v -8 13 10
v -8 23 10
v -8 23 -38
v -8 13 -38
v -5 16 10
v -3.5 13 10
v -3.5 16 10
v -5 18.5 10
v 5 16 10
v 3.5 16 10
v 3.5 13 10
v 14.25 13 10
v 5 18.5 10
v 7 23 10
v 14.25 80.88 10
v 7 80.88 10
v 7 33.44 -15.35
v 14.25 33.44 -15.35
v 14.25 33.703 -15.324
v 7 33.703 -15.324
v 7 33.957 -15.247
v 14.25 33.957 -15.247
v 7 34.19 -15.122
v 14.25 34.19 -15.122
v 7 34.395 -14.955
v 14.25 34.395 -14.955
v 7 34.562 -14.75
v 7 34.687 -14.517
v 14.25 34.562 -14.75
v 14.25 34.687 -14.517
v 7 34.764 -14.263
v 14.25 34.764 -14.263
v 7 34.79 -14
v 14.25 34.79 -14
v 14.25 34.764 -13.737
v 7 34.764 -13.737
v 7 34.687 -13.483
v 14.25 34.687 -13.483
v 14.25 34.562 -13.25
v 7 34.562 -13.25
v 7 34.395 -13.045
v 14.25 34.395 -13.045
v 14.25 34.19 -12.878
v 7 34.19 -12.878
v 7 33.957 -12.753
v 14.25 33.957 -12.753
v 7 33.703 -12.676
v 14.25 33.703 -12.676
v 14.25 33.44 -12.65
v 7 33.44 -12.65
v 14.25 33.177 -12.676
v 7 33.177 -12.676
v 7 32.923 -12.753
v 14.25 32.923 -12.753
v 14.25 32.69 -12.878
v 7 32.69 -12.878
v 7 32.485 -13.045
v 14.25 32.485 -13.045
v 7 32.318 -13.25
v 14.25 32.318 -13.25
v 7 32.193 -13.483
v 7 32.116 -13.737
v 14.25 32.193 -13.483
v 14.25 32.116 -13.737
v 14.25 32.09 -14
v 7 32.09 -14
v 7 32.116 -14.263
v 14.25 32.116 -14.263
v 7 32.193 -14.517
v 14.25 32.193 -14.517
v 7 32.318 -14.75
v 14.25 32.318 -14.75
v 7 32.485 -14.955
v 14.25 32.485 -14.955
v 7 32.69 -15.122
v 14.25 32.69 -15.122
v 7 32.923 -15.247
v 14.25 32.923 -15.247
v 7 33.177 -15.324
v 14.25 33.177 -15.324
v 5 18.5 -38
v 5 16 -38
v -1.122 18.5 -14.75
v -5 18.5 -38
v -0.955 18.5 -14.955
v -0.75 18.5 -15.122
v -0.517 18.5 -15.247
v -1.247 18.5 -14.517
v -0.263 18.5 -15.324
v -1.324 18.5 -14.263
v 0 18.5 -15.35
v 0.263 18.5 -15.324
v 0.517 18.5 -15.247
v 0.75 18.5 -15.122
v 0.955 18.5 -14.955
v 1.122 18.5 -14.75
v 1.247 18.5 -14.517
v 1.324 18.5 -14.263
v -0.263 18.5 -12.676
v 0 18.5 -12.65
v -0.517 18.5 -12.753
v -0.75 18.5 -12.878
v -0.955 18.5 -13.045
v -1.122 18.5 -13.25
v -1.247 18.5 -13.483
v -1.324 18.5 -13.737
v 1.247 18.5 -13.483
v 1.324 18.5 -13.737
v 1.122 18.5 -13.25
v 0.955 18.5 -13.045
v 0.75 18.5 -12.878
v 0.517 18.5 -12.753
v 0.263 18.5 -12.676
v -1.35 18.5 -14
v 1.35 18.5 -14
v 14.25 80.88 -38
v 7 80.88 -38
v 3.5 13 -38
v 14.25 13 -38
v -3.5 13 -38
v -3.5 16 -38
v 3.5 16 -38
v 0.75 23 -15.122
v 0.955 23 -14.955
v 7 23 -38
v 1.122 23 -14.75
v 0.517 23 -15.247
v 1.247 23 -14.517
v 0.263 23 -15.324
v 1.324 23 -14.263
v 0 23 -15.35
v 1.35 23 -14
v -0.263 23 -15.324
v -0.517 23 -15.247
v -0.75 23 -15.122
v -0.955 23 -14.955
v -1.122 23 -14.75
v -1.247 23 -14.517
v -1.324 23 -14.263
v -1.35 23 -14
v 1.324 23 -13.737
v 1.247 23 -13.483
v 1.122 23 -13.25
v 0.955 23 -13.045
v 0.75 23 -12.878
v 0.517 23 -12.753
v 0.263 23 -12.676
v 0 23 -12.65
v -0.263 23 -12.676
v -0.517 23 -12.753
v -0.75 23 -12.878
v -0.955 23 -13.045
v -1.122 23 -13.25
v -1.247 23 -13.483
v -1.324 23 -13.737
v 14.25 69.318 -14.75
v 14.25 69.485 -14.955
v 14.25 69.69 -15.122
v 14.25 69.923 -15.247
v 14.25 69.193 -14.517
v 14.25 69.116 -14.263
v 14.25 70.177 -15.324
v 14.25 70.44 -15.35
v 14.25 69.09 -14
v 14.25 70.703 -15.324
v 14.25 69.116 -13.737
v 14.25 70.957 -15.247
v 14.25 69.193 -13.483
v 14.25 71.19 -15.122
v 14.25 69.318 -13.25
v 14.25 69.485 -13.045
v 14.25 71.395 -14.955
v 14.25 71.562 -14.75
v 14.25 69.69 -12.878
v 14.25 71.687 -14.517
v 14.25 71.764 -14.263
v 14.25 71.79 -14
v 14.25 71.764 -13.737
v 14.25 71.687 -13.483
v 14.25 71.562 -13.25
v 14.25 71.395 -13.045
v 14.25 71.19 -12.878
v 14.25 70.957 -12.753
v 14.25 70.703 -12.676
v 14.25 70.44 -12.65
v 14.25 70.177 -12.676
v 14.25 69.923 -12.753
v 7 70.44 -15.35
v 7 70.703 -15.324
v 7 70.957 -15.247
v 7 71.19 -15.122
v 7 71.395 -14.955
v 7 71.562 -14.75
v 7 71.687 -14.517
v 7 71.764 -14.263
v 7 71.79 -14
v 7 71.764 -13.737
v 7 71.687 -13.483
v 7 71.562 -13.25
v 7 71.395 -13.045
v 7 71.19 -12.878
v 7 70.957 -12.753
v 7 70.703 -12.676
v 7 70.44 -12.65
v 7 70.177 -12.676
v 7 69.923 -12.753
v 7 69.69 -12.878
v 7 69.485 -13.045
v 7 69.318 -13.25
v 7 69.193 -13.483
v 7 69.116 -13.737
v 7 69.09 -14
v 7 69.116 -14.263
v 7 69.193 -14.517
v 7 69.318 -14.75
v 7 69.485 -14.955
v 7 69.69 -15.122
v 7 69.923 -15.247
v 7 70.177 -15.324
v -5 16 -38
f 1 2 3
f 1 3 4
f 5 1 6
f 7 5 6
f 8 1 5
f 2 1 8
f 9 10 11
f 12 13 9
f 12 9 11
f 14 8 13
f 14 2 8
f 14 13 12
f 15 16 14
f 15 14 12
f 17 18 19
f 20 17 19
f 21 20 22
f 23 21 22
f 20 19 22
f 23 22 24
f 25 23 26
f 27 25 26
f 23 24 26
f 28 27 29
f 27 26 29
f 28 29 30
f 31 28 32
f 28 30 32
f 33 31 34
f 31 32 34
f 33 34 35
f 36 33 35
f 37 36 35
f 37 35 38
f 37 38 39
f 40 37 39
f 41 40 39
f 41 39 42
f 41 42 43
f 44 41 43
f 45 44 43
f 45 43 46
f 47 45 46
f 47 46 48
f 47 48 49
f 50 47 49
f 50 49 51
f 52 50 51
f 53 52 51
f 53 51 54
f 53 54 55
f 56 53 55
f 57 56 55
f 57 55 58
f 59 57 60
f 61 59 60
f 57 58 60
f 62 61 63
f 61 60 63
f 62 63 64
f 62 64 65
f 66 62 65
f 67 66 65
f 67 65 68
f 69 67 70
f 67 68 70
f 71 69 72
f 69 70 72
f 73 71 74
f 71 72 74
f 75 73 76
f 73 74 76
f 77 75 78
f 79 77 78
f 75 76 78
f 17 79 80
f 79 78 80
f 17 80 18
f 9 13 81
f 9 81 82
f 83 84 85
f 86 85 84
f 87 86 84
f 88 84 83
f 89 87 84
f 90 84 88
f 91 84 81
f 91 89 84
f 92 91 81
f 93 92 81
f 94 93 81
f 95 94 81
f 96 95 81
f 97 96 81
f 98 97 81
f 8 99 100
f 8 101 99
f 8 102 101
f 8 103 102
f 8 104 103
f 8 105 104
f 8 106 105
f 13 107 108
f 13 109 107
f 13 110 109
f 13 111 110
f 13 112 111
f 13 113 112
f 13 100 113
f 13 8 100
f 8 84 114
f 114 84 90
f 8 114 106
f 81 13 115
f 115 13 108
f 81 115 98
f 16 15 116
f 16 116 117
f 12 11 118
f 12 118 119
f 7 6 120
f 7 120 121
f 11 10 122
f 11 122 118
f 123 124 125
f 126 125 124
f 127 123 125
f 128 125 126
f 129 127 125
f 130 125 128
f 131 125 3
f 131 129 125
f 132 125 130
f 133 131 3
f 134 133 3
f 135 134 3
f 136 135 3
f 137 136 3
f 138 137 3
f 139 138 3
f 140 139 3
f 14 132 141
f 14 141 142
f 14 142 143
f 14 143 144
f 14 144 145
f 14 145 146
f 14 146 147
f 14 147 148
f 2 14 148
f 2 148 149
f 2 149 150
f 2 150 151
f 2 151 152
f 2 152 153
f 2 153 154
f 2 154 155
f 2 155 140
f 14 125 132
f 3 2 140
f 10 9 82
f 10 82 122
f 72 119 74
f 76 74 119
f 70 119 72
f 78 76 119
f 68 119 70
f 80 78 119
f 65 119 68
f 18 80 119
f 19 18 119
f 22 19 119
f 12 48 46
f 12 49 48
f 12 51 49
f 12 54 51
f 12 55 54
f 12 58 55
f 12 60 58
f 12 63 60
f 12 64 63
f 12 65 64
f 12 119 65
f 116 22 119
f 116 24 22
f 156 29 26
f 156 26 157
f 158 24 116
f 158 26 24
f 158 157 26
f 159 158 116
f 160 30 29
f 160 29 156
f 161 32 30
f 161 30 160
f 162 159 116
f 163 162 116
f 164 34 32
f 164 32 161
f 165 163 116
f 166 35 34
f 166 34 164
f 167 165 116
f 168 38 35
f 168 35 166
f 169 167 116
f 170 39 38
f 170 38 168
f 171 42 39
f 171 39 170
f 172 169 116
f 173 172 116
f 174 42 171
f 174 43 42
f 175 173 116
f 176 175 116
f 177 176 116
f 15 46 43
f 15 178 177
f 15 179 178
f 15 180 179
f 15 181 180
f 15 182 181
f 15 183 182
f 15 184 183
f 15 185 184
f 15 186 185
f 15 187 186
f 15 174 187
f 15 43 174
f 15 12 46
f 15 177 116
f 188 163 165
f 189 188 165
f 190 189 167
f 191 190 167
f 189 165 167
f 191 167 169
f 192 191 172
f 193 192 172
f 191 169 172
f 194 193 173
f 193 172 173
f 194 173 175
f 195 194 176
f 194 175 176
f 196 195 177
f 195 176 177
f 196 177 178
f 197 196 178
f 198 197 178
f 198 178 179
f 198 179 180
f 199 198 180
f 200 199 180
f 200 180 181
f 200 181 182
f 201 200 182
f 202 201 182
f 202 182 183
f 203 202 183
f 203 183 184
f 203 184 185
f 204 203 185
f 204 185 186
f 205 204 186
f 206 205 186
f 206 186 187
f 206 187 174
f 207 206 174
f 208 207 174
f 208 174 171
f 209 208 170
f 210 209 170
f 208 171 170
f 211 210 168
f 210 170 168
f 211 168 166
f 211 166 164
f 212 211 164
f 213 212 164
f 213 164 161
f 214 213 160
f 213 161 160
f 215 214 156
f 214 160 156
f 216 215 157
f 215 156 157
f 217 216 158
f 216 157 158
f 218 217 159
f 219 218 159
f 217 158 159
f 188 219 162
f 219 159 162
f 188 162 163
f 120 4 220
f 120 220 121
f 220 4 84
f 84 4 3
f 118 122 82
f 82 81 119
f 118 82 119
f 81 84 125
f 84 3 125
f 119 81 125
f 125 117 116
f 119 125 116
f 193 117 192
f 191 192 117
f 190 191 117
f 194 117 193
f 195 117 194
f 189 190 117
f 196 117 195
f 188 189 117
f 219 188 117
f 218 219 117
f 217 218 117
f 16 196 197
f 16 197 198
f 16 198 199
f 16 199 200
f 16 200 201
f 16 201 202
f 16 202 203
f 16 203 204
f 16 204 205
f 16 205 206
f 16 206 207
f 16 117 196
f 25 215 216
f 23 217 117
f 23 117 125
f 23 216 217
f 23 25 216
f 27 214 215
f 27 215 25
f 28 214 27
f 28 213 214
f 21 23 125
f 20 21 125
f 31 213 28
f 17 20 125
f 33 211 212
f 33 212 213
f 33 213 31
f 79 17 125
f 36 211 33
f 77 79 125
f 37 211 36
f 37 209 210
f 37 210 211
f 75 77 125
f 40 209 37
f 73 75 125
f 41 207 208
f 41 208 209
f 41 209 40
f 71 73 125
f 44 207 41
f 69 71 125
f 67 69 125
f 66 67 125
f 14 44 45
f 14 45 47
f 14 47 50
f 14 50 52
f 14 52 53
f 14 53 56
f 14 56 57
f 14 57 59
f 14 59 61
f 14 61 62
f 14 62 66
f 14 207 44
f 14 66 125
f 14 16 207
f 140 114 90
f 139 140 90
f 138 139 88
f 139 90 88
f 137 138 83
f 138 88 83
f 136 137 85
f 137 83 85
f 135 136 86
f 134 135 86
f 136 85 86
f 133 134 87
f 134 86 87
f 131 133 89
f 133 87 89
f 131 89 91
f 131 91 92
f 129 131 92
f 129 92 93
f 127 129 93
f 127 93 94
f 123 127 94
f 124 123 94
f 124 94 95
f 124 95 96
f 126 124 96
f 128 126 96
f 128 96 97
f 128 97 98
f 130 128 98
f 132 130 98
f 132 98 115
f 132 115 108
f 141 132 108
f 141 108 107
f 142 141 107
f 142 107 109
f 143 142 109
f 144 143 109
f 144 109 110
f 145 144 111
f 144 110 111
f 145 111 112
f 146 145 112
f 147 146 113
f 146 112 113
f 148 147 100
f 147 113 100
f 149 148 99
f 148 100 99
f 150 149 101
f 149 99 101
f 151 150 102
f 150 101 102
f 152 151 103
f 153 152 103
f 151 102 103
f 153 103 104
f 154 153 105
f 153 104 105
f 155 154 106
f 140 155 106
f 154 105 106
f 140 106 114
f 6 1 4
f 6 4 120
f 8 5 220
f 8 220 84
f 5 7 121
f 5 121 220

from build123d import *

# Parameters (mm, degrees)
BOSS_EXTRUDE1_DEPTH    = 48
M2_5_CLEARANCE_HOLE2_D = 2.7
M2_5_CLEARANCE_HOLE3_D = 2.7


with BuildPart() as part:
    # Sketch3 → Boss-Extrude1 (new body)
    with BuildSketch(Plane.XY.offset(10)):
        Polygon((-8, 13), (-3.5, 13), (-3.5, 16), (-5, 16), (-5, 18.5), (5, 18.5), (5, 16), (3.5, 16), (3.5, 13), (14.25, 13), (14.25, 80.88), (7, 80.88), (7, 23), (-8, 23), align=None)
    extrude(amount=-BOSS_EXTRUDE1_DEPTH)

    # M2.5 Clearance Hole2 (through all)
    with Locations(Plane(origin=(0, 23, 0), x_dir=(1, 0, 0), z_dir=(0, 1, 0))):
        with Locations((0, 14)):
            Hole(M2_5_CLEARANCE_HOLE2_D / 2)

    # M2.5 Clearance Hole3 (through all)
    with Locations(Plane.ZY.offset(-7)):
        with Locations((-14, 70.44), (-14, 33.44)):
            Hole(M2_5_CLEARANCE_HOLE3_D / 2)


solid = part.part
